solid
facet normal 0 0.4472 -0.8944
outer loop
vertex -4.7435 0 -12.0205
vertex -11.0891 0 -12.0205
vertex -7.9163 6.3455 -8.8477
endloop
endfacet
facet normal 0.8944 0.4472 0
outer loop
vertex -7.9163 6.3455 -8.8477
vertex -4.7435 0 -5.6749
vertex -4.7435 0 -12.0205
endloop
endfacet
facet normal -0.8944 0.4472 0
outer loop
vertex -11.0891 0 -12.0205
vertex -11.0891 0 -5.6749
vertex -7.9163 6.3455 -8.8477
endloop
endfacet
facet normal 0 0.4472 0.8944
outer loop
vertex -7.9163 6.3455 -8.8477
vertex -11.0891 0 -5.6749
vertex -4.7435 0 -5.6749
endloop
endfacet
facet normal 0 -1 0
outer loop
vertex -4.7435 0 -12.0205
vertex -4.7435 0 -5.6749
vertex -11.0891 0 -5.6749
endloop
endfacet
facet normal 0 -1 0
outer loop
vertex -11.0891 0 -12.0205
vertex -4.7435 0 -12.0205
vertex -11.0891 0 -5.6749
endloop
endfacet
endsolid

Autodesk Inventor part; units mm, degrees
sketch "Sketch1" plane through (0, 0, 0) normal (0, 1, 0) x (-1, 0, 0)
  line L0 (11.0913, -5.6727) -> (4.7413, -5.6727)
  line L1 (4.7413, -5.6727) -> (4.7413, -12.0227)
  line L2 (4.7413, -12.0227) -> (11.0913, -12.0227)
  line L3 (11.0913, -12.0227) -> (11.0913, -5.6727)
  point P0 (0, 0)
  dimension "d0" = 6.35
  dimension "d1" = 6.35
extrude "Extrusion1" add sketch "Sketch1" along normal blind 6.35
sketch "Sketch2" plane through (0, 6.35, 0) normal (0, 1, 0) x (1, 0, 0)
  line L0 (-11.0913, 5.6727) -> (-4.7413, 5.6727) projected
  line L1 (-7.9163, 5.6727) -> (-7.9163, 31.288)
  line L2 (-11.0913, 12.0227) -> (-11.0913, 5.6727) projected
  line L3 (-11.0913, 8.8477) -> (-4.7413, 8.8477)
  line L4 (-4.7413, 5.6727) -> (-4.7413, 12.0227) projected
  point P0 (0, 0)
ref_plane "Work Plane1" through (-11.0913, 6.35, -8.8477) normal (0, -0.4472, -0.8944) x (1, 0, 0)
ref_plane "Work Plane2" through (-7.9163, 6.35, -5.6727) normal (-0.8944, -0.4472, 0) x (0, 0, -1)
sketch "Sketch3" plane through (-7.9163, 6.35, -5.6727) normal (-0.8944, -0.4472, 0) x (0, 0, -1)
  circle A0 centre (4.2078, 1.1693) radius 62.6047
  point P0 (-5.6727, 9.2199)
extrude "Extrusion2" cut sketch "Sketch3" against normal blind 6.35
sketch "Sketch4" plane through (-11.0913, 6.35, -8.8477) normal (0, -0.4472, -0.8944) x (1, 0, 0)
  circle A0 centre (3.6539, 12.2089) radius 78.9893
  point P0 (11.0913, 9.6364)
extrude "Extrusion3" cut sketch "Sketch4" against normal blind 6.35
ref_plane "Work Plane3" through (-7.9163, 6.35, -5.6727) normal (-0.8944, 0.4472, 0) x (0, 0, -1)
sketch "Sketch5" plane through (-7.9163, 6.35, -5.6727) normal (-0.8944, 0.4472, 0) x (0, 0, -1)
  circle A0 centre (14.7734, 12.1787) radius 25.4
  point P0 (-5.6727, 2.1393)
  dimension "d14" = 50.8
extrude "Extrusion4" cut sketch "Sketch5" along normal blind 6.35
ref_plane "Work Plane4" through (-11.0913, 6.35, -8.8477) normal (0, 0.4472, -0.8944) x (1, 0, 0)
sketch "Sketch6" plane through (-11.0913, 6.35, -8.8477) normal (0, 0.4472, -0.8944) x (1, 0, 0)
  circle A0 centre (11.0913, 15.7599) radius 33.5156
  point P0 (11.0913, 1.7228)
extrude "Extrusion5" cut sketch "Sketch6" along normal blind 6.35
properties part number "PyramidPiece-ver1-1111-2021"
